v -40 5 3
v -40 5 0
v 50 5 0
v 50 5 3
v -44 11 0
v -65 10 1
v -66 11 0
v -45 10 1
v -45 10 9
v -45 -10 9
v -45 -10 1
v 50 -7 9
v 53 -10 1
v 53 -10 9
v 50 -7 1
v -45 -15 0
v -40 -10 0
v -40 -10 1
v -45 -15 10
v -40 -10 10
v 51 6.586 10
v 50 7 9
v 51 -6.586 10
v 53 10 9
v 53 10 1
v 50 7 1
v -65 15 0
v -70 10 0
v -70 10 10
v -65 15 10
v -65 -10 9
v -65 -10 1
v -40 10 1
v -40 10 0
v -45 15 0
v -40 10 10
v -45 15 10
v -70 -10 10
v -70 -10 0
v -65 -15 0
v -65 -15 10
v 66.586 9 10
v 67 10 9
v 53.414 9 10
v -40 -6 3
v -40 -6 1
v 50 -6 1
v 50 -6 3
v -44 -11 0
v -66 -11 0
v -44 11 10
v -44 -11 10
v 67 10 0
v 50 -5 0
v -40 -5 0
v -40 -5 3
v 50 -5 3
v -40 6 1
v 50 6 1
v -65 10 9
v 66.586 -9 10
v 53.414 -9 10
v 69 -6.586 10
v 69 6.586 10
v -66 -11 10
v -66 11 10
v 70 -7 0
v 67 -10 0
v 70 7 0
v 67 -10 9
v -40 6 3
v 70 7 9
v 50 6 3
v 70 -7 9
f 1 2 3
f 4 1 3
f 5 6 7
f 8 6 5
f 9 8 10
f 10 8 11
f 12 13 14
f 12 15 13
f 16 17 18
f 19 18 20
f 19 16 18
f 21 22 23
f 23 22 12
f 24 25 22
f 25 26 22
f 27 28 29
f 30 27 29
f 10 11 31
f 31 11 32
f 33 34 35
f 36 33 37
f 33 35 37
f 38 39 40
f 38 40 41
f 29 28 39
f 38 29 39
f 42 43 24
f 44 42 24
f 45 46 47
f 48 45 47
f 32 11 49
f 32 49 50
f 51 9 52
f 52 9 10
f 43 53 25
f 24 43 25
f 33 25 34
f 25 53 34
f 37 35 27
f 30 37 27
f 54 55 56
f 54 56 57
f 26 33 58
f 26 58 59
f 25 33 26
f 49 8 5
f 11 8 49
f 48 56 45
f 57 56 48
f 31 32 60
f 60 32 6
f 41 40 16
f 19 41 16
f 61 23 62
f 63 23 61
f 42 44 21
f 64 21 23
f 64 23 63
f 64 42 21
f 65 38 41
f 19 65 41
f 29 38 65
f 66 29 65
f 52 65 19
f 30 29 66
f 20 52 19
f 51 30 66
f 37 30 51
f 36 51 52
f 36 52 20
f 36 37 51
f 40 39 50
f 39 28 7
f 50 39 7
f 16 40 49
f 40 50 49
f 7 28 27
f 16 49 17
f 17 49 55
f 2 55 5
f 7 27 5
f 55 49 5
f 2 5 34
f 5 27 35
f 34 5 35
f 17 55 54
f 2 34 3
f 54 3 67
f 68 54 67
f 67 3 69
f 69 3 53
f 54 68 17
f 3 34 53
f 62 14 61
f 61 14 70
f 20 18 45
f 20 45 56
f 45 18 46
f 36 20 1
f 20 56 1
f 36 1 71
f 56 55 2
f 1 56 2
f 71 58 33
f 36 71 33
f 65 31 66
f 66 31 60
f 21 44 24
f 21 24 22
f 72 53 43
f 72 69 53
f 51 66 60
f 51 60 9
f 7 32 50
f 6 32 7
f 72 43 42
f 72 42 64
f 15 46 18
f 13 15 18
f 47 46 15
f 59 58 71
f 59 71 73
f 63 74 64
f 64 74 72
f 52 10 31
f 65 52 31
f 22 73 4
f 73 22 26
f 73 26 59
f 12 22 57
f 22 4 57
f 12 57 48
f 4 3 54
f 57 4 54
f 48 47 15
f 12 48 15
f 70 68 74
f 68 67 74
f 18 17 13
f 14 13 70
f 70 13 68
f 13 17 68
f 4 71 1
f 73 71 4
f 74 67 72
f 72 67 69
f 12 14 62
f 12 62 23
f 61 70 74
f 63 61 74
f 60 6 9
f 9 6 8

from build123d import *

# Parameters (mm, degrees)
F0_W     = 90
F0_H     = 5
F1_DEPTH = 1
F0_W_2   = 5
F0_H_2   = 20
F2_DEPTH = 10
F3_W     = 90
F3_H     = 1
F4_DEPTH = 2
F5_SIZE  = 3
F6_SIZE  = 1
F7_SIZE  = 5


with BuildPart() as f1:
    # F0 (on Top) → F1 (new body)
    with BuildSketch(Plane.XY):
        with Locations((5, -7.5)):
            Rectangle(F0_W, F0_H)
    extrude(amount=F1_DEPTH)



with BuildPart() as f1b:
    # F0 (on Top) → F1, piece 2 (new body)
    with BuildSketch(Plane.XY):
        Polygon((50, 5), (50, 10), (-30, 10), (-40, 10), (-40, 5), align=None)
    extrude(amount=F1_DEPTH)


with BuildPart() as f1_1:
    add(f1.part)

    add(f1b.part)  # F2 merges F1b
    # F0 (on Top) → F2 (join)
    with BuildSketch(Plane.XY):
        Polygon((70, -10), (70, 10), (50, 10), (50, 5), (50, -5), (50, -10), align=None)
        Polygon((-45, 10), (-40, 10), (-40, 15), (-70, 15), (-70, 10), (-65, 10), align=None)
        Polygon((-40, 5), (-40, 10), (-45, 10), (-45, -10), (-40, -10), (-40, -5), align=None)
        with Locations((-67.5, 0)):
            Rectangle(F0_W_2, F0_H_2)
        Polygon((-40, -15), (-40, -10), (-45, -10), (-65, -10), (-70, -10), (-70, -15), align=None)
    extrude(amount=F2_DEPTH)

    # F3 (on face) → F4 (join)
    with BuildSketch(Plane.XY.offset(1)):
        with Locations((5, 5.5)):
            Rectangle(F3_W, F3_H)
        with Locations((5, -5.5)):
            Rectangle(F3_W, F3_H)
    extrude(amount=F4_DEPTH)

    # F5
    f5_edges = [f1_1.edges().sort_by_distance(p)[0] for p in [
        (70, -10, 5),
        (70, 10, 5),
        (50, -10, 5.5),
        (50, 10, 5.5),
    ]]
    chamfer(f5_edges, length=F5_SIZE)

    # F6
    f6_edges = [f1_1.edges().sort_by_distance(p)[0] for p in [
        (60, 10, 10),
        (51.5, 8.5, 10),
        (50, 0, 10),
        (51.5, -8.5, 10),
        (60, -10, 10),
        (68.5, -8.5, 10),
        (70, 0, 10),
        (68.5, 8.5, 10),
        (-55, 10, 10),
        (-65, 0, 10),
        (-55, -10, 10),
        (-45, 0, 10),
        (-65, 0, 0),
        (-55, -10, 0),
        (-45, 0, 0),
        (-55, 10, 0),
    ]]
    chamfer(f6_edges, length=F6_SIZE)

    # F7
    f7_edges = [f1_1.edges().sort_by_distance(p)[0] for p in [
        (-40, 15, 5),
        (-70, 15, 5),
        (-70, -15, 5),
        (-40, -15, 5),
    ]]
    chamfer(f7_edges, length=F7_SIZE)


solid = f1_1.part
